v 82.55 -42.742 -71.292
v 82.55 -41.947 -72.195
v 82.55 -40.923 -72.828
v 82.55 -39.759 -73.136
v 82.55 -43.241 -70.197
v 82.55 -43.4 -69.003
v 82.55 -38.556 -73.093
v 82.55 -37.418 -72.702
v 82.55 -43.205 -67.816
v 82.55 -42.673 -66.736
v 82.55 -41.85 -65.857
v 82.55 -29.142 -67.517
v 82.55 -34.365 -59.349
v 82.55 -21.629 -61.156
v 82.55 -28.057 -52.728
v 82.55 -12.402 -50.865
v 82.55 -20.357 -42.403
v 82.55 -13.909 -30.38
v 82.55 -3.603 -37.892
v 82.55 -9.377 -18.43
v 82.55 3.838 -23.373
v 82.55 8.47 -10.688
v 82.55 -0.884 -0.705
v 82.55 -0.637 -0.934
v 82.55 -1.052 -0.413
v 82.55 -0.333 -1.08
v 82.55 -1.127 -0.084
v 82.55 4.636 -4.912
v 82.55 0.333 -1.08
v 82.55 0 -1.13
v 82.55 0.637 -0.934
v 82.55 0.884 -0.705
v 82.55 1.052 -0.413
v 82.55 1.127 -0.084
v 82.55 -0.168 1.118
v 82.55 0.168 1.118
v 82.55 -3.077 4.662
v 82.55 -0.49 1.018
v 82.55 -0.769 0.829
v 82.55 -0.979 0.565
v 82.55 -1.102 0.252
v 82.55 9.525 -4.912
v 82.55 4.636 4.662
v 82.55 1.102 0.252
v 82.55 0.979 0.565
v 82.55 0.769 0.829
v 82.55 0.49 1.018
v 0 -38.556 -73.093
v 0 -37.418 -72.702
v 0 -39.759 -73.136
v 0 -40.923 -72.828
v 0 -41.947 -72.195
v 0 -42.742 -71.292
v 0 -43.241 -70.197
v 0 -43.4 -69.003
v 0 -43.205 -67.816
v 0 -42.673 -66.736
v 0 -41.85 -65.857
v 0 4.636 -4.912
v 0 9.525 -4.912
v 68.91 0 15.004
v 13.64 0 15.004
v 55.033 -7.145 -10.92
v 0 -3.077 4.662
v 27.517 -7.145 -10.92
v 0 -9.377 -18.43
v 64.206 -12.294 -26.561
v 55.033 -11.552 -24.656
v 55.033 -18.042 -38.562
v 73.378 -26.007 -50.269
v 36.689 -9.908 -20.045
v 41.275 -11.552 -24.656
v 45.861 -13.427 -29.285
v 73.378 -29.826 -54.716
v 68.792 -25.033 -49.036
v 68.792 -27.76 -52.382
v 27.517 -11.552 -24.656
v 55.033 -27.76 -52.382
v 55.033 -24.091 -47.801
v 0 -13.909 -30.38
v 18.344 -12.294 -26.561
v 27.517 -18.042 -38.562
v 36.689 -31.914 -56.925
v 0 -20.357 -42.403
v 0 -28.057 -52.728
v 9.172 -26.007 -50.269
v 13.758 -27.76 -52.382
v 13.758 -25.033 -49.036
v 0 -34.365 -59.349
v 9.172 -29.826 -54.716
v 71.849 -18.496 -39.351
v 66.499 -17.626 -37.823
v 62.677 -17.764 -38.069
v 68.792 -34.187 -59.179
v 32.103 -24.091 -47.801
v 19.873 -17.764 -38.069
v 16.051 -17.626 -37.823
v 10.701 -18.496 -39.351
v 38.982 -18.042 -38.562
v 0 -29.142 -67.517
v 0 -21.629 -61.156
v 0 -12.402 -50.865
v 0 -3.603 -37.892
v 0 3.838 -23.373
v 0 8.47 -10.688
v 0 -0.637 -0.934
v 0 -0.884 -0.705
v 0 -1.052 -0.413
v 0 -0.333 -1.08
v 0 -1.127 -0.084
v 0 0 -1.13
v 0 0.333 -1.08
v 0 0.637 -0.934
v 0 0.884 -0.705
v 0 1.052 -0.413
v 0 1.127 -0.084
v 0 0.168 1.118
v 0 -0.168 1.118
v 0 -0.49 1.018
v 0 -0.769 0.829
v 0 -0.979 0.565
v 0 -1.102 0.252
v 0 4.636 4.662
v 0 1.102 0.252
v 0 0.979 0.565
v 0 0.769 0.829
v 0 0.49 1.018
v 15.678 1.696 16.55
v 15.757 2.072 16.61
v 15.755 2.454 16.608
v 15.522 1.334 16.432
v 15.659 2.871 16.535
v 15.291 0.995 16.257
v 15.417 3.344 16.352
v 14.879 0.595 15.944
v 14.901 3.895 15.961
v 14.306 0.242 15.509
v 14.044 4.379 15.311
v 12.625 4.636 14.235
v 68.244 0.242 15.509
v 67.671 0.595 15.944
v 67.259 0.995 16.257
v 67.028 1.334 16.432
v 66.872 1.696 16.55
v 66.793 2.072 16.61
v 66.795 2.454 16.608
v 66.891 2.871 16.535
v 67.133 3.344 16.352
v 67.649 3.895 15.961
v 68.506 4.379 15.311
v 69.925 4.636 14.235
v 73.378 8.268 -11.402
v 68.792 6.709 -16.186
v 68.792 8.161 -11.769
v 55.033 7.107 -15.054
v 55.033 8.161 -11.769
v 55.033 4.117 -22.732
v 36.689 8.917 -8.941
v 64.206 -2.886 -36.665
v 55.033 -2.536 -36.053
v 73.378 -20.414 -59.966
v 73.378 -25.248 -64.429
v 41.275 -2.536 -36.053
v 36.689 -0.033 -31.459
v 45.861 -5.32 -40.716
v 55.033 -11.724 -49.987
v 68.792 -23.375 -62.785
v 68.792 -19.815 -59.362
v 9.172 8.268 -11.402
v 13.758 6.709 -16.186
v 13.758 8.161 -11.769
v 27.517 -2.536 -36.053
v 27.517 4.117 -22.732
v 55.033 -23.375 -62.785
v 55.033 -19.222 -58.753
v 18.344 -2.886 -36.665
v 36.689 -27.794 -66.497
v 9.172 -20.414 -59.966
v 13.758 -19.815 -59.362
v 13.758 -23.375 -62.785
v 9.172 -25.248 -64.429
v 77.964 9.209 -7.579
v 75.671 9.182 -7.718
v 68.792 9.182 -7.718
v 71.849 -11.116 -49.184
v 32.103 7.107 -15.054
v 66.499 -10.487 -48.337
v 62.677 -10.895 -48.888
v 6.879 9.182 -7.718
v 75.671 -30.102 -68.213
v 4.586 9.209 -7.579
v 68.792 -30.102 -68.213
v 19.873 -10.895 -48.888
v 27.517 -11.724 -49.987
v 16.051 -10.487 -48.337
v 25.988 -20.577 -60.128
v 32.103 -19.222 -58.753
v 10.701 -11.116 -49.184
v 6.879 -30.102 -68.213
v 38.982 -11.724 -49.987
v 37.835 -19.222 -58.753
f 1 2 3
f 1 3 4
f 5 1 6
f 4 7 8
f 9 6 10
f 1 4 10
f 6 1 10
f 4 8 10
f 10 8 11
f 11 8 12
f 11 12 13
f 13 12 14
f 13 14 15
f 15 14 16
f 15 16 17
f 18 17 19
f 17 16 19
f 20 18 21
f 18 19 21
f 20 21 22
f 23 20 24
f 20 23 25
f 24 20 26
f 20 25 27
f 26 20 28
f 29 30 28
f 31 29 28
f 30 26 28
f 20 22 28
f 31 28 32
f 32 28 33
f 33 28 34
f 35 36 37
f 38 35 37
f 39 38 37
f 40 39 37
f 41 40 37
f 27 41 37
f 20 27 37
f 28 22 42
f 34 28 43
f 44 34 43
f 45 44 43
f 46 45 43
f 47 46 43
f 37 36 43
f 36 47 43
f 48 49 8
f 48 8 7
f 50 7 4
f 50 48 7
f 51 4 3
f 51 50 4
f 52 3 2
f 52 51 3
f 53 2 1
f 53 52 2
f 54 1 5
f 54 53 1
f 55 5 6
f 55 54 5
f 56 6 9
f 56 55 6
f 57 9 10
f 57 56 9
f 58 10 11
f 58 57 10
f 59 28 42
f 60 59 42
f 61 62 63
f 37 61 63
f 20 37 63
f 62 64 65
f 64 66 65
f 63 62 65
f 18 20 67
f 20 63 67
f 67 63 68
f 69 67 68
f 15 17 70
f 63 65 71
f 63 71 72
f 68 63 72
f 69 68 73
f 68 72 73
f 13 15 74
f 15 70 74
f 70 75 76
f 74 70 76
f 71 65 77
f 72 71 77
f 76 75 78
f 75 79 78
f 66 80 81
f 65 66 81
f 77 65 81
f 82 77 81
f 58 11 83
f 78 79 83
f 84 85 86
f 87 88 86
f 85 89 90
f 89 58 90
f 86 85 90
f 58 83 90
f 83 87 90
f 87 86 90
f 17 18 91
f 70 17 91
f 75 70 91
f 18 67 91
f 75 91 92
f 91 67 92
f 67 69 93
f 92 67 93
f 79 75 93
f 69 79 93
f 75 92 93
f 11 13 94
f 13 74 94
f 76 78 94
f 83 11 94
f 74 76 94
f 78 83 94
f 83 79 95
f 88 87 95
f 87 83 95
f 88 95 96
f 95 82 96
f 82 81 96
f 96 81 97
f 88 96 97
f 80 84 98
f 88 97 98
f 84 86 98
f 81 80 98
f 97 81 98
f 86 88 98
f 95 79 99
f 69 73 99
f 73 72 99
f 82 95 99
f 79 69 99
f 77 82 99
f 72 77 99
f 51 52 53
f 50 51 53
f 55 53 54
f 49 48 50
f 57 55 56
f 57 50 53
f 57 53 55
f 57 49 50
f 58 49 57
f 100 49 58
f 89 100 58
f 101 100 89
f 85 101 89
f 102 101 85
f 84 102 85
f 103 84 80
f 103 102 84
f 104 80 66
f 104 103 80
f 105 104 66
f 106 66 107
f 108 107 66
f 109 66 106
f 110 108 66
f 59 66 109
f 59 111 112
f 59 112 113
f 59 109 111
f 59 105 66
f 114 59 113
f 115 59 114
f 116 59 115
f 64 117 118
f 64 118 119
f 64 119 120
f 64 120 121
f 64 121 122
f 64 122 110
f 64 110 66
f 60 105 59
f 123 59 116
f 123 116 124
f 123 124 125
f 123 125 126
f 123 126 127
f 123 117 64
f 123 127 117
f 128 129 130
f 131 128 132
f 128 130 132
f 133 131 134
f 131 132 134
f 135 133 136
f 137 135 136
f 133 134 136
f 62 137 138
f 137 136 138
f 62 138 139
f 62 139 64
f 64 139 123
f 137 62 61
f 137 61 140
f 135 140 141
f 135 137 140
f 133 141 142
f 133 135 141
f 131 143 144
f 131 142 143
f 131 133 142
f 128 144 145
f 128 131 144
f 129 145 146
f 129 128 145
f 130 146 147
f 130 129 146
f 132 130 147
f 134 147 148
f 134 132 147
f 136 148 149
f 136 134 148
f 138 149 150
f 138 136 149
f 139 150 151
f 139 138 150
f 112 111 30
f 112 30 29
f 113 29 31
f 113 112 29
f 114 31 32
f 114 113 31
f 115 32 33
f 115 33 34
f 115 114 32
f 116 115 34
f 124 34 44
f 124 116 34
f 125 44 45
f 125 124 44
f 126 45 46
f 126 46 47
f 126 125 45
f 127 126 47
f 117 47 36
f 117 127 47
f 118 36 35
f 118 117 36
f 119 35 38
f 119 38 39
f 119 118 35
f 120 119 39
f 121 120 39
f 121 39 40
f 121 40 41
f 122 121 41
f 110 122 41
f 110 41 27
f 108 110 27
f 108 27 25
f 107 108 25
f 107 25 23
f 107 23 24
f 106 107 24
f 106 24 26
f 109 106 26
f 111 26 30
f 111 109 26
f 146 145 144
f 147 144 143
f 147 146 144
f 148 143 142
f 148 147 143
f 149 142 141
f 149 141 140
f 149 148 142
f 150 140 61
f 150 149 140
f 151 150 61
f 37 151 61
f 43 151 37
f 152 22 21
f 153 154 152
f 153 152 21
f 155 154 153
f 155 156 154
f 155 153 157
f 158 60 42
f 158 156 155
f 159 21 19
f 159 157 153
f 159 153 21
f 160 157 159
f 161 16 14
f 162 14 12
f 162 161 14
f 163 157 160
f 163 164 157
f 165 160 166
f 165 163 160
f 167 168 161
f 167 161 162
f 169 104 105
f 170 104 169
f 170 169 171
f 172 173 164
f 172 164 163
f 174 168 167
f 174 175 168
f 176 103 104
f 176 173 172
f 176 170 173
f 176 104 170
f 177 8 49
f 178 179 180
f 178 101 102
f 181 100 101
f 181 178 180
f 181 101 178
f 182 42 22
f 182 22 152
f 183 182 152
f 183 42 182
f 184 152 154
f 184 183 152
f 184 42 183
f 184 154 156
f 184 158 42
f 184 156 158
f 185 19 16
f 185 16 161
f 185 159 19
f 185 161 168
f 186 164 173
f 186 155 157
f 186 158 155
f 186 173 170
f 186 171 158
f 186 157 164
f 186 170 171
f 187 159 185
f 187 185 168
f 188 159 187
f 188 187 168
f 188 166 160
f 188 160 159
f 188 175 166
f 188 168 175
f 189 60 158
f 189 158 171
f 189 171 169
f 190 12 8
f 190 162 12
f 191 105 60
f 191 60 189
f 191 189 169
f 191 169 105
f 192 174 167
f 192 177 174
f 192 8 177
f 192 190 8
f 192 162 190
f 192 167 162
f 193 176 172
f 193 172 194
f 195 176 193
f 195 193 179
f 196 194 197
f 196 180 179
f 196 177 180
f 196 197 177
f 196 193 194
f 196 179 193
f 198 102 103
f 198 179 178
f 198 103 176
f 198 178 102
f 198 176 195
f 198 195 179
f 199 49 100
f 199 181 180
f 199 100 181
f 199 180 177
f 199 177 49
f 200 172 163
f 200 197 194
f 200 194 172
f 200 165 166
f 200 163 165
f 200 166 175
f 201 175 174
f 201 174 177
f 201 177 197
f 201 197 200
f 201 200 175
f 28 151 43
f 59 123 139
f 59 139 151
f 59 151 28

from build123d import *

# Parameters (mm, degrees)
SKETCH1_R           = 1.1303
BOSS_EXTRUDE1_DEPTH = 82.55
CUT_EXTRUDE1_DEPTH  = 121.310224488


with BuildPart() as part:
    # Sketch1 → Boss-Extrude1 (new body)
    with BuildSketch(Plane(origin=(0, 0, 0), x_dir=(0, 0, -1), z_dir=(1, 0, 0))):
        with BuildLine():
            Line((-14.235037061, 4.6355), (4.911613569, 4.6355))
            Line((4.911613569, 4.6355), (4.911613569, 9.525))
            add(Edge.make_bspline(
                [(4.911613569, 9.525), (13.356859809, 9.525), (56.914542054, -6.988883897), (72.701512247, -37.41793147)],
                knots=[0, 0, 0, 0, 1, 1, 1, 1], degree=3))
            ThreePointArc((72.701512247, -37.41793147), (71.292110965, -42.742171877), (65.857227597, -41.849988788))
            add(Edge.make_bspline(
                [(-15.004369583, 0), (9.374116417, -8.321172008), (39.423381365, -8.534365891), (65.857227597, -41.849988788)],
                knots=[0, 0, 0, 0, 1, 1, 1, 1], degree=3))
            ThreePointArc((-15.004369583, 0), (-16.584490869, 2.643836713), (-14.235037061, 4.6355))
        make_face()
        Circle(SKETCH1_R, mode=Mode.SUBTRACT)
    extrude(amount=BOSS_EXTRUDE1_DEPTH)

    # Sketch2 → Cut-Extrude1 (cut, through all)
    with BuildSketch(Plane(origin=(0, 4.6355, 0), x_dir=(1, 0, 0), z_dir=(0, 1, 0))):
        Polygon((0, -4.661711746), (0, -18.489908959), (18.236274836, -18.489908959), align=None)
        Polygon((82.55, -4.661711746), (82.55, -18.489908959), (64.313725164, -18.489908959), align=None)
    extrude(amount=-CUT_EXTRUDE1_DEPTH, mode=Mode.SUBTRACT)


solid = part.part
